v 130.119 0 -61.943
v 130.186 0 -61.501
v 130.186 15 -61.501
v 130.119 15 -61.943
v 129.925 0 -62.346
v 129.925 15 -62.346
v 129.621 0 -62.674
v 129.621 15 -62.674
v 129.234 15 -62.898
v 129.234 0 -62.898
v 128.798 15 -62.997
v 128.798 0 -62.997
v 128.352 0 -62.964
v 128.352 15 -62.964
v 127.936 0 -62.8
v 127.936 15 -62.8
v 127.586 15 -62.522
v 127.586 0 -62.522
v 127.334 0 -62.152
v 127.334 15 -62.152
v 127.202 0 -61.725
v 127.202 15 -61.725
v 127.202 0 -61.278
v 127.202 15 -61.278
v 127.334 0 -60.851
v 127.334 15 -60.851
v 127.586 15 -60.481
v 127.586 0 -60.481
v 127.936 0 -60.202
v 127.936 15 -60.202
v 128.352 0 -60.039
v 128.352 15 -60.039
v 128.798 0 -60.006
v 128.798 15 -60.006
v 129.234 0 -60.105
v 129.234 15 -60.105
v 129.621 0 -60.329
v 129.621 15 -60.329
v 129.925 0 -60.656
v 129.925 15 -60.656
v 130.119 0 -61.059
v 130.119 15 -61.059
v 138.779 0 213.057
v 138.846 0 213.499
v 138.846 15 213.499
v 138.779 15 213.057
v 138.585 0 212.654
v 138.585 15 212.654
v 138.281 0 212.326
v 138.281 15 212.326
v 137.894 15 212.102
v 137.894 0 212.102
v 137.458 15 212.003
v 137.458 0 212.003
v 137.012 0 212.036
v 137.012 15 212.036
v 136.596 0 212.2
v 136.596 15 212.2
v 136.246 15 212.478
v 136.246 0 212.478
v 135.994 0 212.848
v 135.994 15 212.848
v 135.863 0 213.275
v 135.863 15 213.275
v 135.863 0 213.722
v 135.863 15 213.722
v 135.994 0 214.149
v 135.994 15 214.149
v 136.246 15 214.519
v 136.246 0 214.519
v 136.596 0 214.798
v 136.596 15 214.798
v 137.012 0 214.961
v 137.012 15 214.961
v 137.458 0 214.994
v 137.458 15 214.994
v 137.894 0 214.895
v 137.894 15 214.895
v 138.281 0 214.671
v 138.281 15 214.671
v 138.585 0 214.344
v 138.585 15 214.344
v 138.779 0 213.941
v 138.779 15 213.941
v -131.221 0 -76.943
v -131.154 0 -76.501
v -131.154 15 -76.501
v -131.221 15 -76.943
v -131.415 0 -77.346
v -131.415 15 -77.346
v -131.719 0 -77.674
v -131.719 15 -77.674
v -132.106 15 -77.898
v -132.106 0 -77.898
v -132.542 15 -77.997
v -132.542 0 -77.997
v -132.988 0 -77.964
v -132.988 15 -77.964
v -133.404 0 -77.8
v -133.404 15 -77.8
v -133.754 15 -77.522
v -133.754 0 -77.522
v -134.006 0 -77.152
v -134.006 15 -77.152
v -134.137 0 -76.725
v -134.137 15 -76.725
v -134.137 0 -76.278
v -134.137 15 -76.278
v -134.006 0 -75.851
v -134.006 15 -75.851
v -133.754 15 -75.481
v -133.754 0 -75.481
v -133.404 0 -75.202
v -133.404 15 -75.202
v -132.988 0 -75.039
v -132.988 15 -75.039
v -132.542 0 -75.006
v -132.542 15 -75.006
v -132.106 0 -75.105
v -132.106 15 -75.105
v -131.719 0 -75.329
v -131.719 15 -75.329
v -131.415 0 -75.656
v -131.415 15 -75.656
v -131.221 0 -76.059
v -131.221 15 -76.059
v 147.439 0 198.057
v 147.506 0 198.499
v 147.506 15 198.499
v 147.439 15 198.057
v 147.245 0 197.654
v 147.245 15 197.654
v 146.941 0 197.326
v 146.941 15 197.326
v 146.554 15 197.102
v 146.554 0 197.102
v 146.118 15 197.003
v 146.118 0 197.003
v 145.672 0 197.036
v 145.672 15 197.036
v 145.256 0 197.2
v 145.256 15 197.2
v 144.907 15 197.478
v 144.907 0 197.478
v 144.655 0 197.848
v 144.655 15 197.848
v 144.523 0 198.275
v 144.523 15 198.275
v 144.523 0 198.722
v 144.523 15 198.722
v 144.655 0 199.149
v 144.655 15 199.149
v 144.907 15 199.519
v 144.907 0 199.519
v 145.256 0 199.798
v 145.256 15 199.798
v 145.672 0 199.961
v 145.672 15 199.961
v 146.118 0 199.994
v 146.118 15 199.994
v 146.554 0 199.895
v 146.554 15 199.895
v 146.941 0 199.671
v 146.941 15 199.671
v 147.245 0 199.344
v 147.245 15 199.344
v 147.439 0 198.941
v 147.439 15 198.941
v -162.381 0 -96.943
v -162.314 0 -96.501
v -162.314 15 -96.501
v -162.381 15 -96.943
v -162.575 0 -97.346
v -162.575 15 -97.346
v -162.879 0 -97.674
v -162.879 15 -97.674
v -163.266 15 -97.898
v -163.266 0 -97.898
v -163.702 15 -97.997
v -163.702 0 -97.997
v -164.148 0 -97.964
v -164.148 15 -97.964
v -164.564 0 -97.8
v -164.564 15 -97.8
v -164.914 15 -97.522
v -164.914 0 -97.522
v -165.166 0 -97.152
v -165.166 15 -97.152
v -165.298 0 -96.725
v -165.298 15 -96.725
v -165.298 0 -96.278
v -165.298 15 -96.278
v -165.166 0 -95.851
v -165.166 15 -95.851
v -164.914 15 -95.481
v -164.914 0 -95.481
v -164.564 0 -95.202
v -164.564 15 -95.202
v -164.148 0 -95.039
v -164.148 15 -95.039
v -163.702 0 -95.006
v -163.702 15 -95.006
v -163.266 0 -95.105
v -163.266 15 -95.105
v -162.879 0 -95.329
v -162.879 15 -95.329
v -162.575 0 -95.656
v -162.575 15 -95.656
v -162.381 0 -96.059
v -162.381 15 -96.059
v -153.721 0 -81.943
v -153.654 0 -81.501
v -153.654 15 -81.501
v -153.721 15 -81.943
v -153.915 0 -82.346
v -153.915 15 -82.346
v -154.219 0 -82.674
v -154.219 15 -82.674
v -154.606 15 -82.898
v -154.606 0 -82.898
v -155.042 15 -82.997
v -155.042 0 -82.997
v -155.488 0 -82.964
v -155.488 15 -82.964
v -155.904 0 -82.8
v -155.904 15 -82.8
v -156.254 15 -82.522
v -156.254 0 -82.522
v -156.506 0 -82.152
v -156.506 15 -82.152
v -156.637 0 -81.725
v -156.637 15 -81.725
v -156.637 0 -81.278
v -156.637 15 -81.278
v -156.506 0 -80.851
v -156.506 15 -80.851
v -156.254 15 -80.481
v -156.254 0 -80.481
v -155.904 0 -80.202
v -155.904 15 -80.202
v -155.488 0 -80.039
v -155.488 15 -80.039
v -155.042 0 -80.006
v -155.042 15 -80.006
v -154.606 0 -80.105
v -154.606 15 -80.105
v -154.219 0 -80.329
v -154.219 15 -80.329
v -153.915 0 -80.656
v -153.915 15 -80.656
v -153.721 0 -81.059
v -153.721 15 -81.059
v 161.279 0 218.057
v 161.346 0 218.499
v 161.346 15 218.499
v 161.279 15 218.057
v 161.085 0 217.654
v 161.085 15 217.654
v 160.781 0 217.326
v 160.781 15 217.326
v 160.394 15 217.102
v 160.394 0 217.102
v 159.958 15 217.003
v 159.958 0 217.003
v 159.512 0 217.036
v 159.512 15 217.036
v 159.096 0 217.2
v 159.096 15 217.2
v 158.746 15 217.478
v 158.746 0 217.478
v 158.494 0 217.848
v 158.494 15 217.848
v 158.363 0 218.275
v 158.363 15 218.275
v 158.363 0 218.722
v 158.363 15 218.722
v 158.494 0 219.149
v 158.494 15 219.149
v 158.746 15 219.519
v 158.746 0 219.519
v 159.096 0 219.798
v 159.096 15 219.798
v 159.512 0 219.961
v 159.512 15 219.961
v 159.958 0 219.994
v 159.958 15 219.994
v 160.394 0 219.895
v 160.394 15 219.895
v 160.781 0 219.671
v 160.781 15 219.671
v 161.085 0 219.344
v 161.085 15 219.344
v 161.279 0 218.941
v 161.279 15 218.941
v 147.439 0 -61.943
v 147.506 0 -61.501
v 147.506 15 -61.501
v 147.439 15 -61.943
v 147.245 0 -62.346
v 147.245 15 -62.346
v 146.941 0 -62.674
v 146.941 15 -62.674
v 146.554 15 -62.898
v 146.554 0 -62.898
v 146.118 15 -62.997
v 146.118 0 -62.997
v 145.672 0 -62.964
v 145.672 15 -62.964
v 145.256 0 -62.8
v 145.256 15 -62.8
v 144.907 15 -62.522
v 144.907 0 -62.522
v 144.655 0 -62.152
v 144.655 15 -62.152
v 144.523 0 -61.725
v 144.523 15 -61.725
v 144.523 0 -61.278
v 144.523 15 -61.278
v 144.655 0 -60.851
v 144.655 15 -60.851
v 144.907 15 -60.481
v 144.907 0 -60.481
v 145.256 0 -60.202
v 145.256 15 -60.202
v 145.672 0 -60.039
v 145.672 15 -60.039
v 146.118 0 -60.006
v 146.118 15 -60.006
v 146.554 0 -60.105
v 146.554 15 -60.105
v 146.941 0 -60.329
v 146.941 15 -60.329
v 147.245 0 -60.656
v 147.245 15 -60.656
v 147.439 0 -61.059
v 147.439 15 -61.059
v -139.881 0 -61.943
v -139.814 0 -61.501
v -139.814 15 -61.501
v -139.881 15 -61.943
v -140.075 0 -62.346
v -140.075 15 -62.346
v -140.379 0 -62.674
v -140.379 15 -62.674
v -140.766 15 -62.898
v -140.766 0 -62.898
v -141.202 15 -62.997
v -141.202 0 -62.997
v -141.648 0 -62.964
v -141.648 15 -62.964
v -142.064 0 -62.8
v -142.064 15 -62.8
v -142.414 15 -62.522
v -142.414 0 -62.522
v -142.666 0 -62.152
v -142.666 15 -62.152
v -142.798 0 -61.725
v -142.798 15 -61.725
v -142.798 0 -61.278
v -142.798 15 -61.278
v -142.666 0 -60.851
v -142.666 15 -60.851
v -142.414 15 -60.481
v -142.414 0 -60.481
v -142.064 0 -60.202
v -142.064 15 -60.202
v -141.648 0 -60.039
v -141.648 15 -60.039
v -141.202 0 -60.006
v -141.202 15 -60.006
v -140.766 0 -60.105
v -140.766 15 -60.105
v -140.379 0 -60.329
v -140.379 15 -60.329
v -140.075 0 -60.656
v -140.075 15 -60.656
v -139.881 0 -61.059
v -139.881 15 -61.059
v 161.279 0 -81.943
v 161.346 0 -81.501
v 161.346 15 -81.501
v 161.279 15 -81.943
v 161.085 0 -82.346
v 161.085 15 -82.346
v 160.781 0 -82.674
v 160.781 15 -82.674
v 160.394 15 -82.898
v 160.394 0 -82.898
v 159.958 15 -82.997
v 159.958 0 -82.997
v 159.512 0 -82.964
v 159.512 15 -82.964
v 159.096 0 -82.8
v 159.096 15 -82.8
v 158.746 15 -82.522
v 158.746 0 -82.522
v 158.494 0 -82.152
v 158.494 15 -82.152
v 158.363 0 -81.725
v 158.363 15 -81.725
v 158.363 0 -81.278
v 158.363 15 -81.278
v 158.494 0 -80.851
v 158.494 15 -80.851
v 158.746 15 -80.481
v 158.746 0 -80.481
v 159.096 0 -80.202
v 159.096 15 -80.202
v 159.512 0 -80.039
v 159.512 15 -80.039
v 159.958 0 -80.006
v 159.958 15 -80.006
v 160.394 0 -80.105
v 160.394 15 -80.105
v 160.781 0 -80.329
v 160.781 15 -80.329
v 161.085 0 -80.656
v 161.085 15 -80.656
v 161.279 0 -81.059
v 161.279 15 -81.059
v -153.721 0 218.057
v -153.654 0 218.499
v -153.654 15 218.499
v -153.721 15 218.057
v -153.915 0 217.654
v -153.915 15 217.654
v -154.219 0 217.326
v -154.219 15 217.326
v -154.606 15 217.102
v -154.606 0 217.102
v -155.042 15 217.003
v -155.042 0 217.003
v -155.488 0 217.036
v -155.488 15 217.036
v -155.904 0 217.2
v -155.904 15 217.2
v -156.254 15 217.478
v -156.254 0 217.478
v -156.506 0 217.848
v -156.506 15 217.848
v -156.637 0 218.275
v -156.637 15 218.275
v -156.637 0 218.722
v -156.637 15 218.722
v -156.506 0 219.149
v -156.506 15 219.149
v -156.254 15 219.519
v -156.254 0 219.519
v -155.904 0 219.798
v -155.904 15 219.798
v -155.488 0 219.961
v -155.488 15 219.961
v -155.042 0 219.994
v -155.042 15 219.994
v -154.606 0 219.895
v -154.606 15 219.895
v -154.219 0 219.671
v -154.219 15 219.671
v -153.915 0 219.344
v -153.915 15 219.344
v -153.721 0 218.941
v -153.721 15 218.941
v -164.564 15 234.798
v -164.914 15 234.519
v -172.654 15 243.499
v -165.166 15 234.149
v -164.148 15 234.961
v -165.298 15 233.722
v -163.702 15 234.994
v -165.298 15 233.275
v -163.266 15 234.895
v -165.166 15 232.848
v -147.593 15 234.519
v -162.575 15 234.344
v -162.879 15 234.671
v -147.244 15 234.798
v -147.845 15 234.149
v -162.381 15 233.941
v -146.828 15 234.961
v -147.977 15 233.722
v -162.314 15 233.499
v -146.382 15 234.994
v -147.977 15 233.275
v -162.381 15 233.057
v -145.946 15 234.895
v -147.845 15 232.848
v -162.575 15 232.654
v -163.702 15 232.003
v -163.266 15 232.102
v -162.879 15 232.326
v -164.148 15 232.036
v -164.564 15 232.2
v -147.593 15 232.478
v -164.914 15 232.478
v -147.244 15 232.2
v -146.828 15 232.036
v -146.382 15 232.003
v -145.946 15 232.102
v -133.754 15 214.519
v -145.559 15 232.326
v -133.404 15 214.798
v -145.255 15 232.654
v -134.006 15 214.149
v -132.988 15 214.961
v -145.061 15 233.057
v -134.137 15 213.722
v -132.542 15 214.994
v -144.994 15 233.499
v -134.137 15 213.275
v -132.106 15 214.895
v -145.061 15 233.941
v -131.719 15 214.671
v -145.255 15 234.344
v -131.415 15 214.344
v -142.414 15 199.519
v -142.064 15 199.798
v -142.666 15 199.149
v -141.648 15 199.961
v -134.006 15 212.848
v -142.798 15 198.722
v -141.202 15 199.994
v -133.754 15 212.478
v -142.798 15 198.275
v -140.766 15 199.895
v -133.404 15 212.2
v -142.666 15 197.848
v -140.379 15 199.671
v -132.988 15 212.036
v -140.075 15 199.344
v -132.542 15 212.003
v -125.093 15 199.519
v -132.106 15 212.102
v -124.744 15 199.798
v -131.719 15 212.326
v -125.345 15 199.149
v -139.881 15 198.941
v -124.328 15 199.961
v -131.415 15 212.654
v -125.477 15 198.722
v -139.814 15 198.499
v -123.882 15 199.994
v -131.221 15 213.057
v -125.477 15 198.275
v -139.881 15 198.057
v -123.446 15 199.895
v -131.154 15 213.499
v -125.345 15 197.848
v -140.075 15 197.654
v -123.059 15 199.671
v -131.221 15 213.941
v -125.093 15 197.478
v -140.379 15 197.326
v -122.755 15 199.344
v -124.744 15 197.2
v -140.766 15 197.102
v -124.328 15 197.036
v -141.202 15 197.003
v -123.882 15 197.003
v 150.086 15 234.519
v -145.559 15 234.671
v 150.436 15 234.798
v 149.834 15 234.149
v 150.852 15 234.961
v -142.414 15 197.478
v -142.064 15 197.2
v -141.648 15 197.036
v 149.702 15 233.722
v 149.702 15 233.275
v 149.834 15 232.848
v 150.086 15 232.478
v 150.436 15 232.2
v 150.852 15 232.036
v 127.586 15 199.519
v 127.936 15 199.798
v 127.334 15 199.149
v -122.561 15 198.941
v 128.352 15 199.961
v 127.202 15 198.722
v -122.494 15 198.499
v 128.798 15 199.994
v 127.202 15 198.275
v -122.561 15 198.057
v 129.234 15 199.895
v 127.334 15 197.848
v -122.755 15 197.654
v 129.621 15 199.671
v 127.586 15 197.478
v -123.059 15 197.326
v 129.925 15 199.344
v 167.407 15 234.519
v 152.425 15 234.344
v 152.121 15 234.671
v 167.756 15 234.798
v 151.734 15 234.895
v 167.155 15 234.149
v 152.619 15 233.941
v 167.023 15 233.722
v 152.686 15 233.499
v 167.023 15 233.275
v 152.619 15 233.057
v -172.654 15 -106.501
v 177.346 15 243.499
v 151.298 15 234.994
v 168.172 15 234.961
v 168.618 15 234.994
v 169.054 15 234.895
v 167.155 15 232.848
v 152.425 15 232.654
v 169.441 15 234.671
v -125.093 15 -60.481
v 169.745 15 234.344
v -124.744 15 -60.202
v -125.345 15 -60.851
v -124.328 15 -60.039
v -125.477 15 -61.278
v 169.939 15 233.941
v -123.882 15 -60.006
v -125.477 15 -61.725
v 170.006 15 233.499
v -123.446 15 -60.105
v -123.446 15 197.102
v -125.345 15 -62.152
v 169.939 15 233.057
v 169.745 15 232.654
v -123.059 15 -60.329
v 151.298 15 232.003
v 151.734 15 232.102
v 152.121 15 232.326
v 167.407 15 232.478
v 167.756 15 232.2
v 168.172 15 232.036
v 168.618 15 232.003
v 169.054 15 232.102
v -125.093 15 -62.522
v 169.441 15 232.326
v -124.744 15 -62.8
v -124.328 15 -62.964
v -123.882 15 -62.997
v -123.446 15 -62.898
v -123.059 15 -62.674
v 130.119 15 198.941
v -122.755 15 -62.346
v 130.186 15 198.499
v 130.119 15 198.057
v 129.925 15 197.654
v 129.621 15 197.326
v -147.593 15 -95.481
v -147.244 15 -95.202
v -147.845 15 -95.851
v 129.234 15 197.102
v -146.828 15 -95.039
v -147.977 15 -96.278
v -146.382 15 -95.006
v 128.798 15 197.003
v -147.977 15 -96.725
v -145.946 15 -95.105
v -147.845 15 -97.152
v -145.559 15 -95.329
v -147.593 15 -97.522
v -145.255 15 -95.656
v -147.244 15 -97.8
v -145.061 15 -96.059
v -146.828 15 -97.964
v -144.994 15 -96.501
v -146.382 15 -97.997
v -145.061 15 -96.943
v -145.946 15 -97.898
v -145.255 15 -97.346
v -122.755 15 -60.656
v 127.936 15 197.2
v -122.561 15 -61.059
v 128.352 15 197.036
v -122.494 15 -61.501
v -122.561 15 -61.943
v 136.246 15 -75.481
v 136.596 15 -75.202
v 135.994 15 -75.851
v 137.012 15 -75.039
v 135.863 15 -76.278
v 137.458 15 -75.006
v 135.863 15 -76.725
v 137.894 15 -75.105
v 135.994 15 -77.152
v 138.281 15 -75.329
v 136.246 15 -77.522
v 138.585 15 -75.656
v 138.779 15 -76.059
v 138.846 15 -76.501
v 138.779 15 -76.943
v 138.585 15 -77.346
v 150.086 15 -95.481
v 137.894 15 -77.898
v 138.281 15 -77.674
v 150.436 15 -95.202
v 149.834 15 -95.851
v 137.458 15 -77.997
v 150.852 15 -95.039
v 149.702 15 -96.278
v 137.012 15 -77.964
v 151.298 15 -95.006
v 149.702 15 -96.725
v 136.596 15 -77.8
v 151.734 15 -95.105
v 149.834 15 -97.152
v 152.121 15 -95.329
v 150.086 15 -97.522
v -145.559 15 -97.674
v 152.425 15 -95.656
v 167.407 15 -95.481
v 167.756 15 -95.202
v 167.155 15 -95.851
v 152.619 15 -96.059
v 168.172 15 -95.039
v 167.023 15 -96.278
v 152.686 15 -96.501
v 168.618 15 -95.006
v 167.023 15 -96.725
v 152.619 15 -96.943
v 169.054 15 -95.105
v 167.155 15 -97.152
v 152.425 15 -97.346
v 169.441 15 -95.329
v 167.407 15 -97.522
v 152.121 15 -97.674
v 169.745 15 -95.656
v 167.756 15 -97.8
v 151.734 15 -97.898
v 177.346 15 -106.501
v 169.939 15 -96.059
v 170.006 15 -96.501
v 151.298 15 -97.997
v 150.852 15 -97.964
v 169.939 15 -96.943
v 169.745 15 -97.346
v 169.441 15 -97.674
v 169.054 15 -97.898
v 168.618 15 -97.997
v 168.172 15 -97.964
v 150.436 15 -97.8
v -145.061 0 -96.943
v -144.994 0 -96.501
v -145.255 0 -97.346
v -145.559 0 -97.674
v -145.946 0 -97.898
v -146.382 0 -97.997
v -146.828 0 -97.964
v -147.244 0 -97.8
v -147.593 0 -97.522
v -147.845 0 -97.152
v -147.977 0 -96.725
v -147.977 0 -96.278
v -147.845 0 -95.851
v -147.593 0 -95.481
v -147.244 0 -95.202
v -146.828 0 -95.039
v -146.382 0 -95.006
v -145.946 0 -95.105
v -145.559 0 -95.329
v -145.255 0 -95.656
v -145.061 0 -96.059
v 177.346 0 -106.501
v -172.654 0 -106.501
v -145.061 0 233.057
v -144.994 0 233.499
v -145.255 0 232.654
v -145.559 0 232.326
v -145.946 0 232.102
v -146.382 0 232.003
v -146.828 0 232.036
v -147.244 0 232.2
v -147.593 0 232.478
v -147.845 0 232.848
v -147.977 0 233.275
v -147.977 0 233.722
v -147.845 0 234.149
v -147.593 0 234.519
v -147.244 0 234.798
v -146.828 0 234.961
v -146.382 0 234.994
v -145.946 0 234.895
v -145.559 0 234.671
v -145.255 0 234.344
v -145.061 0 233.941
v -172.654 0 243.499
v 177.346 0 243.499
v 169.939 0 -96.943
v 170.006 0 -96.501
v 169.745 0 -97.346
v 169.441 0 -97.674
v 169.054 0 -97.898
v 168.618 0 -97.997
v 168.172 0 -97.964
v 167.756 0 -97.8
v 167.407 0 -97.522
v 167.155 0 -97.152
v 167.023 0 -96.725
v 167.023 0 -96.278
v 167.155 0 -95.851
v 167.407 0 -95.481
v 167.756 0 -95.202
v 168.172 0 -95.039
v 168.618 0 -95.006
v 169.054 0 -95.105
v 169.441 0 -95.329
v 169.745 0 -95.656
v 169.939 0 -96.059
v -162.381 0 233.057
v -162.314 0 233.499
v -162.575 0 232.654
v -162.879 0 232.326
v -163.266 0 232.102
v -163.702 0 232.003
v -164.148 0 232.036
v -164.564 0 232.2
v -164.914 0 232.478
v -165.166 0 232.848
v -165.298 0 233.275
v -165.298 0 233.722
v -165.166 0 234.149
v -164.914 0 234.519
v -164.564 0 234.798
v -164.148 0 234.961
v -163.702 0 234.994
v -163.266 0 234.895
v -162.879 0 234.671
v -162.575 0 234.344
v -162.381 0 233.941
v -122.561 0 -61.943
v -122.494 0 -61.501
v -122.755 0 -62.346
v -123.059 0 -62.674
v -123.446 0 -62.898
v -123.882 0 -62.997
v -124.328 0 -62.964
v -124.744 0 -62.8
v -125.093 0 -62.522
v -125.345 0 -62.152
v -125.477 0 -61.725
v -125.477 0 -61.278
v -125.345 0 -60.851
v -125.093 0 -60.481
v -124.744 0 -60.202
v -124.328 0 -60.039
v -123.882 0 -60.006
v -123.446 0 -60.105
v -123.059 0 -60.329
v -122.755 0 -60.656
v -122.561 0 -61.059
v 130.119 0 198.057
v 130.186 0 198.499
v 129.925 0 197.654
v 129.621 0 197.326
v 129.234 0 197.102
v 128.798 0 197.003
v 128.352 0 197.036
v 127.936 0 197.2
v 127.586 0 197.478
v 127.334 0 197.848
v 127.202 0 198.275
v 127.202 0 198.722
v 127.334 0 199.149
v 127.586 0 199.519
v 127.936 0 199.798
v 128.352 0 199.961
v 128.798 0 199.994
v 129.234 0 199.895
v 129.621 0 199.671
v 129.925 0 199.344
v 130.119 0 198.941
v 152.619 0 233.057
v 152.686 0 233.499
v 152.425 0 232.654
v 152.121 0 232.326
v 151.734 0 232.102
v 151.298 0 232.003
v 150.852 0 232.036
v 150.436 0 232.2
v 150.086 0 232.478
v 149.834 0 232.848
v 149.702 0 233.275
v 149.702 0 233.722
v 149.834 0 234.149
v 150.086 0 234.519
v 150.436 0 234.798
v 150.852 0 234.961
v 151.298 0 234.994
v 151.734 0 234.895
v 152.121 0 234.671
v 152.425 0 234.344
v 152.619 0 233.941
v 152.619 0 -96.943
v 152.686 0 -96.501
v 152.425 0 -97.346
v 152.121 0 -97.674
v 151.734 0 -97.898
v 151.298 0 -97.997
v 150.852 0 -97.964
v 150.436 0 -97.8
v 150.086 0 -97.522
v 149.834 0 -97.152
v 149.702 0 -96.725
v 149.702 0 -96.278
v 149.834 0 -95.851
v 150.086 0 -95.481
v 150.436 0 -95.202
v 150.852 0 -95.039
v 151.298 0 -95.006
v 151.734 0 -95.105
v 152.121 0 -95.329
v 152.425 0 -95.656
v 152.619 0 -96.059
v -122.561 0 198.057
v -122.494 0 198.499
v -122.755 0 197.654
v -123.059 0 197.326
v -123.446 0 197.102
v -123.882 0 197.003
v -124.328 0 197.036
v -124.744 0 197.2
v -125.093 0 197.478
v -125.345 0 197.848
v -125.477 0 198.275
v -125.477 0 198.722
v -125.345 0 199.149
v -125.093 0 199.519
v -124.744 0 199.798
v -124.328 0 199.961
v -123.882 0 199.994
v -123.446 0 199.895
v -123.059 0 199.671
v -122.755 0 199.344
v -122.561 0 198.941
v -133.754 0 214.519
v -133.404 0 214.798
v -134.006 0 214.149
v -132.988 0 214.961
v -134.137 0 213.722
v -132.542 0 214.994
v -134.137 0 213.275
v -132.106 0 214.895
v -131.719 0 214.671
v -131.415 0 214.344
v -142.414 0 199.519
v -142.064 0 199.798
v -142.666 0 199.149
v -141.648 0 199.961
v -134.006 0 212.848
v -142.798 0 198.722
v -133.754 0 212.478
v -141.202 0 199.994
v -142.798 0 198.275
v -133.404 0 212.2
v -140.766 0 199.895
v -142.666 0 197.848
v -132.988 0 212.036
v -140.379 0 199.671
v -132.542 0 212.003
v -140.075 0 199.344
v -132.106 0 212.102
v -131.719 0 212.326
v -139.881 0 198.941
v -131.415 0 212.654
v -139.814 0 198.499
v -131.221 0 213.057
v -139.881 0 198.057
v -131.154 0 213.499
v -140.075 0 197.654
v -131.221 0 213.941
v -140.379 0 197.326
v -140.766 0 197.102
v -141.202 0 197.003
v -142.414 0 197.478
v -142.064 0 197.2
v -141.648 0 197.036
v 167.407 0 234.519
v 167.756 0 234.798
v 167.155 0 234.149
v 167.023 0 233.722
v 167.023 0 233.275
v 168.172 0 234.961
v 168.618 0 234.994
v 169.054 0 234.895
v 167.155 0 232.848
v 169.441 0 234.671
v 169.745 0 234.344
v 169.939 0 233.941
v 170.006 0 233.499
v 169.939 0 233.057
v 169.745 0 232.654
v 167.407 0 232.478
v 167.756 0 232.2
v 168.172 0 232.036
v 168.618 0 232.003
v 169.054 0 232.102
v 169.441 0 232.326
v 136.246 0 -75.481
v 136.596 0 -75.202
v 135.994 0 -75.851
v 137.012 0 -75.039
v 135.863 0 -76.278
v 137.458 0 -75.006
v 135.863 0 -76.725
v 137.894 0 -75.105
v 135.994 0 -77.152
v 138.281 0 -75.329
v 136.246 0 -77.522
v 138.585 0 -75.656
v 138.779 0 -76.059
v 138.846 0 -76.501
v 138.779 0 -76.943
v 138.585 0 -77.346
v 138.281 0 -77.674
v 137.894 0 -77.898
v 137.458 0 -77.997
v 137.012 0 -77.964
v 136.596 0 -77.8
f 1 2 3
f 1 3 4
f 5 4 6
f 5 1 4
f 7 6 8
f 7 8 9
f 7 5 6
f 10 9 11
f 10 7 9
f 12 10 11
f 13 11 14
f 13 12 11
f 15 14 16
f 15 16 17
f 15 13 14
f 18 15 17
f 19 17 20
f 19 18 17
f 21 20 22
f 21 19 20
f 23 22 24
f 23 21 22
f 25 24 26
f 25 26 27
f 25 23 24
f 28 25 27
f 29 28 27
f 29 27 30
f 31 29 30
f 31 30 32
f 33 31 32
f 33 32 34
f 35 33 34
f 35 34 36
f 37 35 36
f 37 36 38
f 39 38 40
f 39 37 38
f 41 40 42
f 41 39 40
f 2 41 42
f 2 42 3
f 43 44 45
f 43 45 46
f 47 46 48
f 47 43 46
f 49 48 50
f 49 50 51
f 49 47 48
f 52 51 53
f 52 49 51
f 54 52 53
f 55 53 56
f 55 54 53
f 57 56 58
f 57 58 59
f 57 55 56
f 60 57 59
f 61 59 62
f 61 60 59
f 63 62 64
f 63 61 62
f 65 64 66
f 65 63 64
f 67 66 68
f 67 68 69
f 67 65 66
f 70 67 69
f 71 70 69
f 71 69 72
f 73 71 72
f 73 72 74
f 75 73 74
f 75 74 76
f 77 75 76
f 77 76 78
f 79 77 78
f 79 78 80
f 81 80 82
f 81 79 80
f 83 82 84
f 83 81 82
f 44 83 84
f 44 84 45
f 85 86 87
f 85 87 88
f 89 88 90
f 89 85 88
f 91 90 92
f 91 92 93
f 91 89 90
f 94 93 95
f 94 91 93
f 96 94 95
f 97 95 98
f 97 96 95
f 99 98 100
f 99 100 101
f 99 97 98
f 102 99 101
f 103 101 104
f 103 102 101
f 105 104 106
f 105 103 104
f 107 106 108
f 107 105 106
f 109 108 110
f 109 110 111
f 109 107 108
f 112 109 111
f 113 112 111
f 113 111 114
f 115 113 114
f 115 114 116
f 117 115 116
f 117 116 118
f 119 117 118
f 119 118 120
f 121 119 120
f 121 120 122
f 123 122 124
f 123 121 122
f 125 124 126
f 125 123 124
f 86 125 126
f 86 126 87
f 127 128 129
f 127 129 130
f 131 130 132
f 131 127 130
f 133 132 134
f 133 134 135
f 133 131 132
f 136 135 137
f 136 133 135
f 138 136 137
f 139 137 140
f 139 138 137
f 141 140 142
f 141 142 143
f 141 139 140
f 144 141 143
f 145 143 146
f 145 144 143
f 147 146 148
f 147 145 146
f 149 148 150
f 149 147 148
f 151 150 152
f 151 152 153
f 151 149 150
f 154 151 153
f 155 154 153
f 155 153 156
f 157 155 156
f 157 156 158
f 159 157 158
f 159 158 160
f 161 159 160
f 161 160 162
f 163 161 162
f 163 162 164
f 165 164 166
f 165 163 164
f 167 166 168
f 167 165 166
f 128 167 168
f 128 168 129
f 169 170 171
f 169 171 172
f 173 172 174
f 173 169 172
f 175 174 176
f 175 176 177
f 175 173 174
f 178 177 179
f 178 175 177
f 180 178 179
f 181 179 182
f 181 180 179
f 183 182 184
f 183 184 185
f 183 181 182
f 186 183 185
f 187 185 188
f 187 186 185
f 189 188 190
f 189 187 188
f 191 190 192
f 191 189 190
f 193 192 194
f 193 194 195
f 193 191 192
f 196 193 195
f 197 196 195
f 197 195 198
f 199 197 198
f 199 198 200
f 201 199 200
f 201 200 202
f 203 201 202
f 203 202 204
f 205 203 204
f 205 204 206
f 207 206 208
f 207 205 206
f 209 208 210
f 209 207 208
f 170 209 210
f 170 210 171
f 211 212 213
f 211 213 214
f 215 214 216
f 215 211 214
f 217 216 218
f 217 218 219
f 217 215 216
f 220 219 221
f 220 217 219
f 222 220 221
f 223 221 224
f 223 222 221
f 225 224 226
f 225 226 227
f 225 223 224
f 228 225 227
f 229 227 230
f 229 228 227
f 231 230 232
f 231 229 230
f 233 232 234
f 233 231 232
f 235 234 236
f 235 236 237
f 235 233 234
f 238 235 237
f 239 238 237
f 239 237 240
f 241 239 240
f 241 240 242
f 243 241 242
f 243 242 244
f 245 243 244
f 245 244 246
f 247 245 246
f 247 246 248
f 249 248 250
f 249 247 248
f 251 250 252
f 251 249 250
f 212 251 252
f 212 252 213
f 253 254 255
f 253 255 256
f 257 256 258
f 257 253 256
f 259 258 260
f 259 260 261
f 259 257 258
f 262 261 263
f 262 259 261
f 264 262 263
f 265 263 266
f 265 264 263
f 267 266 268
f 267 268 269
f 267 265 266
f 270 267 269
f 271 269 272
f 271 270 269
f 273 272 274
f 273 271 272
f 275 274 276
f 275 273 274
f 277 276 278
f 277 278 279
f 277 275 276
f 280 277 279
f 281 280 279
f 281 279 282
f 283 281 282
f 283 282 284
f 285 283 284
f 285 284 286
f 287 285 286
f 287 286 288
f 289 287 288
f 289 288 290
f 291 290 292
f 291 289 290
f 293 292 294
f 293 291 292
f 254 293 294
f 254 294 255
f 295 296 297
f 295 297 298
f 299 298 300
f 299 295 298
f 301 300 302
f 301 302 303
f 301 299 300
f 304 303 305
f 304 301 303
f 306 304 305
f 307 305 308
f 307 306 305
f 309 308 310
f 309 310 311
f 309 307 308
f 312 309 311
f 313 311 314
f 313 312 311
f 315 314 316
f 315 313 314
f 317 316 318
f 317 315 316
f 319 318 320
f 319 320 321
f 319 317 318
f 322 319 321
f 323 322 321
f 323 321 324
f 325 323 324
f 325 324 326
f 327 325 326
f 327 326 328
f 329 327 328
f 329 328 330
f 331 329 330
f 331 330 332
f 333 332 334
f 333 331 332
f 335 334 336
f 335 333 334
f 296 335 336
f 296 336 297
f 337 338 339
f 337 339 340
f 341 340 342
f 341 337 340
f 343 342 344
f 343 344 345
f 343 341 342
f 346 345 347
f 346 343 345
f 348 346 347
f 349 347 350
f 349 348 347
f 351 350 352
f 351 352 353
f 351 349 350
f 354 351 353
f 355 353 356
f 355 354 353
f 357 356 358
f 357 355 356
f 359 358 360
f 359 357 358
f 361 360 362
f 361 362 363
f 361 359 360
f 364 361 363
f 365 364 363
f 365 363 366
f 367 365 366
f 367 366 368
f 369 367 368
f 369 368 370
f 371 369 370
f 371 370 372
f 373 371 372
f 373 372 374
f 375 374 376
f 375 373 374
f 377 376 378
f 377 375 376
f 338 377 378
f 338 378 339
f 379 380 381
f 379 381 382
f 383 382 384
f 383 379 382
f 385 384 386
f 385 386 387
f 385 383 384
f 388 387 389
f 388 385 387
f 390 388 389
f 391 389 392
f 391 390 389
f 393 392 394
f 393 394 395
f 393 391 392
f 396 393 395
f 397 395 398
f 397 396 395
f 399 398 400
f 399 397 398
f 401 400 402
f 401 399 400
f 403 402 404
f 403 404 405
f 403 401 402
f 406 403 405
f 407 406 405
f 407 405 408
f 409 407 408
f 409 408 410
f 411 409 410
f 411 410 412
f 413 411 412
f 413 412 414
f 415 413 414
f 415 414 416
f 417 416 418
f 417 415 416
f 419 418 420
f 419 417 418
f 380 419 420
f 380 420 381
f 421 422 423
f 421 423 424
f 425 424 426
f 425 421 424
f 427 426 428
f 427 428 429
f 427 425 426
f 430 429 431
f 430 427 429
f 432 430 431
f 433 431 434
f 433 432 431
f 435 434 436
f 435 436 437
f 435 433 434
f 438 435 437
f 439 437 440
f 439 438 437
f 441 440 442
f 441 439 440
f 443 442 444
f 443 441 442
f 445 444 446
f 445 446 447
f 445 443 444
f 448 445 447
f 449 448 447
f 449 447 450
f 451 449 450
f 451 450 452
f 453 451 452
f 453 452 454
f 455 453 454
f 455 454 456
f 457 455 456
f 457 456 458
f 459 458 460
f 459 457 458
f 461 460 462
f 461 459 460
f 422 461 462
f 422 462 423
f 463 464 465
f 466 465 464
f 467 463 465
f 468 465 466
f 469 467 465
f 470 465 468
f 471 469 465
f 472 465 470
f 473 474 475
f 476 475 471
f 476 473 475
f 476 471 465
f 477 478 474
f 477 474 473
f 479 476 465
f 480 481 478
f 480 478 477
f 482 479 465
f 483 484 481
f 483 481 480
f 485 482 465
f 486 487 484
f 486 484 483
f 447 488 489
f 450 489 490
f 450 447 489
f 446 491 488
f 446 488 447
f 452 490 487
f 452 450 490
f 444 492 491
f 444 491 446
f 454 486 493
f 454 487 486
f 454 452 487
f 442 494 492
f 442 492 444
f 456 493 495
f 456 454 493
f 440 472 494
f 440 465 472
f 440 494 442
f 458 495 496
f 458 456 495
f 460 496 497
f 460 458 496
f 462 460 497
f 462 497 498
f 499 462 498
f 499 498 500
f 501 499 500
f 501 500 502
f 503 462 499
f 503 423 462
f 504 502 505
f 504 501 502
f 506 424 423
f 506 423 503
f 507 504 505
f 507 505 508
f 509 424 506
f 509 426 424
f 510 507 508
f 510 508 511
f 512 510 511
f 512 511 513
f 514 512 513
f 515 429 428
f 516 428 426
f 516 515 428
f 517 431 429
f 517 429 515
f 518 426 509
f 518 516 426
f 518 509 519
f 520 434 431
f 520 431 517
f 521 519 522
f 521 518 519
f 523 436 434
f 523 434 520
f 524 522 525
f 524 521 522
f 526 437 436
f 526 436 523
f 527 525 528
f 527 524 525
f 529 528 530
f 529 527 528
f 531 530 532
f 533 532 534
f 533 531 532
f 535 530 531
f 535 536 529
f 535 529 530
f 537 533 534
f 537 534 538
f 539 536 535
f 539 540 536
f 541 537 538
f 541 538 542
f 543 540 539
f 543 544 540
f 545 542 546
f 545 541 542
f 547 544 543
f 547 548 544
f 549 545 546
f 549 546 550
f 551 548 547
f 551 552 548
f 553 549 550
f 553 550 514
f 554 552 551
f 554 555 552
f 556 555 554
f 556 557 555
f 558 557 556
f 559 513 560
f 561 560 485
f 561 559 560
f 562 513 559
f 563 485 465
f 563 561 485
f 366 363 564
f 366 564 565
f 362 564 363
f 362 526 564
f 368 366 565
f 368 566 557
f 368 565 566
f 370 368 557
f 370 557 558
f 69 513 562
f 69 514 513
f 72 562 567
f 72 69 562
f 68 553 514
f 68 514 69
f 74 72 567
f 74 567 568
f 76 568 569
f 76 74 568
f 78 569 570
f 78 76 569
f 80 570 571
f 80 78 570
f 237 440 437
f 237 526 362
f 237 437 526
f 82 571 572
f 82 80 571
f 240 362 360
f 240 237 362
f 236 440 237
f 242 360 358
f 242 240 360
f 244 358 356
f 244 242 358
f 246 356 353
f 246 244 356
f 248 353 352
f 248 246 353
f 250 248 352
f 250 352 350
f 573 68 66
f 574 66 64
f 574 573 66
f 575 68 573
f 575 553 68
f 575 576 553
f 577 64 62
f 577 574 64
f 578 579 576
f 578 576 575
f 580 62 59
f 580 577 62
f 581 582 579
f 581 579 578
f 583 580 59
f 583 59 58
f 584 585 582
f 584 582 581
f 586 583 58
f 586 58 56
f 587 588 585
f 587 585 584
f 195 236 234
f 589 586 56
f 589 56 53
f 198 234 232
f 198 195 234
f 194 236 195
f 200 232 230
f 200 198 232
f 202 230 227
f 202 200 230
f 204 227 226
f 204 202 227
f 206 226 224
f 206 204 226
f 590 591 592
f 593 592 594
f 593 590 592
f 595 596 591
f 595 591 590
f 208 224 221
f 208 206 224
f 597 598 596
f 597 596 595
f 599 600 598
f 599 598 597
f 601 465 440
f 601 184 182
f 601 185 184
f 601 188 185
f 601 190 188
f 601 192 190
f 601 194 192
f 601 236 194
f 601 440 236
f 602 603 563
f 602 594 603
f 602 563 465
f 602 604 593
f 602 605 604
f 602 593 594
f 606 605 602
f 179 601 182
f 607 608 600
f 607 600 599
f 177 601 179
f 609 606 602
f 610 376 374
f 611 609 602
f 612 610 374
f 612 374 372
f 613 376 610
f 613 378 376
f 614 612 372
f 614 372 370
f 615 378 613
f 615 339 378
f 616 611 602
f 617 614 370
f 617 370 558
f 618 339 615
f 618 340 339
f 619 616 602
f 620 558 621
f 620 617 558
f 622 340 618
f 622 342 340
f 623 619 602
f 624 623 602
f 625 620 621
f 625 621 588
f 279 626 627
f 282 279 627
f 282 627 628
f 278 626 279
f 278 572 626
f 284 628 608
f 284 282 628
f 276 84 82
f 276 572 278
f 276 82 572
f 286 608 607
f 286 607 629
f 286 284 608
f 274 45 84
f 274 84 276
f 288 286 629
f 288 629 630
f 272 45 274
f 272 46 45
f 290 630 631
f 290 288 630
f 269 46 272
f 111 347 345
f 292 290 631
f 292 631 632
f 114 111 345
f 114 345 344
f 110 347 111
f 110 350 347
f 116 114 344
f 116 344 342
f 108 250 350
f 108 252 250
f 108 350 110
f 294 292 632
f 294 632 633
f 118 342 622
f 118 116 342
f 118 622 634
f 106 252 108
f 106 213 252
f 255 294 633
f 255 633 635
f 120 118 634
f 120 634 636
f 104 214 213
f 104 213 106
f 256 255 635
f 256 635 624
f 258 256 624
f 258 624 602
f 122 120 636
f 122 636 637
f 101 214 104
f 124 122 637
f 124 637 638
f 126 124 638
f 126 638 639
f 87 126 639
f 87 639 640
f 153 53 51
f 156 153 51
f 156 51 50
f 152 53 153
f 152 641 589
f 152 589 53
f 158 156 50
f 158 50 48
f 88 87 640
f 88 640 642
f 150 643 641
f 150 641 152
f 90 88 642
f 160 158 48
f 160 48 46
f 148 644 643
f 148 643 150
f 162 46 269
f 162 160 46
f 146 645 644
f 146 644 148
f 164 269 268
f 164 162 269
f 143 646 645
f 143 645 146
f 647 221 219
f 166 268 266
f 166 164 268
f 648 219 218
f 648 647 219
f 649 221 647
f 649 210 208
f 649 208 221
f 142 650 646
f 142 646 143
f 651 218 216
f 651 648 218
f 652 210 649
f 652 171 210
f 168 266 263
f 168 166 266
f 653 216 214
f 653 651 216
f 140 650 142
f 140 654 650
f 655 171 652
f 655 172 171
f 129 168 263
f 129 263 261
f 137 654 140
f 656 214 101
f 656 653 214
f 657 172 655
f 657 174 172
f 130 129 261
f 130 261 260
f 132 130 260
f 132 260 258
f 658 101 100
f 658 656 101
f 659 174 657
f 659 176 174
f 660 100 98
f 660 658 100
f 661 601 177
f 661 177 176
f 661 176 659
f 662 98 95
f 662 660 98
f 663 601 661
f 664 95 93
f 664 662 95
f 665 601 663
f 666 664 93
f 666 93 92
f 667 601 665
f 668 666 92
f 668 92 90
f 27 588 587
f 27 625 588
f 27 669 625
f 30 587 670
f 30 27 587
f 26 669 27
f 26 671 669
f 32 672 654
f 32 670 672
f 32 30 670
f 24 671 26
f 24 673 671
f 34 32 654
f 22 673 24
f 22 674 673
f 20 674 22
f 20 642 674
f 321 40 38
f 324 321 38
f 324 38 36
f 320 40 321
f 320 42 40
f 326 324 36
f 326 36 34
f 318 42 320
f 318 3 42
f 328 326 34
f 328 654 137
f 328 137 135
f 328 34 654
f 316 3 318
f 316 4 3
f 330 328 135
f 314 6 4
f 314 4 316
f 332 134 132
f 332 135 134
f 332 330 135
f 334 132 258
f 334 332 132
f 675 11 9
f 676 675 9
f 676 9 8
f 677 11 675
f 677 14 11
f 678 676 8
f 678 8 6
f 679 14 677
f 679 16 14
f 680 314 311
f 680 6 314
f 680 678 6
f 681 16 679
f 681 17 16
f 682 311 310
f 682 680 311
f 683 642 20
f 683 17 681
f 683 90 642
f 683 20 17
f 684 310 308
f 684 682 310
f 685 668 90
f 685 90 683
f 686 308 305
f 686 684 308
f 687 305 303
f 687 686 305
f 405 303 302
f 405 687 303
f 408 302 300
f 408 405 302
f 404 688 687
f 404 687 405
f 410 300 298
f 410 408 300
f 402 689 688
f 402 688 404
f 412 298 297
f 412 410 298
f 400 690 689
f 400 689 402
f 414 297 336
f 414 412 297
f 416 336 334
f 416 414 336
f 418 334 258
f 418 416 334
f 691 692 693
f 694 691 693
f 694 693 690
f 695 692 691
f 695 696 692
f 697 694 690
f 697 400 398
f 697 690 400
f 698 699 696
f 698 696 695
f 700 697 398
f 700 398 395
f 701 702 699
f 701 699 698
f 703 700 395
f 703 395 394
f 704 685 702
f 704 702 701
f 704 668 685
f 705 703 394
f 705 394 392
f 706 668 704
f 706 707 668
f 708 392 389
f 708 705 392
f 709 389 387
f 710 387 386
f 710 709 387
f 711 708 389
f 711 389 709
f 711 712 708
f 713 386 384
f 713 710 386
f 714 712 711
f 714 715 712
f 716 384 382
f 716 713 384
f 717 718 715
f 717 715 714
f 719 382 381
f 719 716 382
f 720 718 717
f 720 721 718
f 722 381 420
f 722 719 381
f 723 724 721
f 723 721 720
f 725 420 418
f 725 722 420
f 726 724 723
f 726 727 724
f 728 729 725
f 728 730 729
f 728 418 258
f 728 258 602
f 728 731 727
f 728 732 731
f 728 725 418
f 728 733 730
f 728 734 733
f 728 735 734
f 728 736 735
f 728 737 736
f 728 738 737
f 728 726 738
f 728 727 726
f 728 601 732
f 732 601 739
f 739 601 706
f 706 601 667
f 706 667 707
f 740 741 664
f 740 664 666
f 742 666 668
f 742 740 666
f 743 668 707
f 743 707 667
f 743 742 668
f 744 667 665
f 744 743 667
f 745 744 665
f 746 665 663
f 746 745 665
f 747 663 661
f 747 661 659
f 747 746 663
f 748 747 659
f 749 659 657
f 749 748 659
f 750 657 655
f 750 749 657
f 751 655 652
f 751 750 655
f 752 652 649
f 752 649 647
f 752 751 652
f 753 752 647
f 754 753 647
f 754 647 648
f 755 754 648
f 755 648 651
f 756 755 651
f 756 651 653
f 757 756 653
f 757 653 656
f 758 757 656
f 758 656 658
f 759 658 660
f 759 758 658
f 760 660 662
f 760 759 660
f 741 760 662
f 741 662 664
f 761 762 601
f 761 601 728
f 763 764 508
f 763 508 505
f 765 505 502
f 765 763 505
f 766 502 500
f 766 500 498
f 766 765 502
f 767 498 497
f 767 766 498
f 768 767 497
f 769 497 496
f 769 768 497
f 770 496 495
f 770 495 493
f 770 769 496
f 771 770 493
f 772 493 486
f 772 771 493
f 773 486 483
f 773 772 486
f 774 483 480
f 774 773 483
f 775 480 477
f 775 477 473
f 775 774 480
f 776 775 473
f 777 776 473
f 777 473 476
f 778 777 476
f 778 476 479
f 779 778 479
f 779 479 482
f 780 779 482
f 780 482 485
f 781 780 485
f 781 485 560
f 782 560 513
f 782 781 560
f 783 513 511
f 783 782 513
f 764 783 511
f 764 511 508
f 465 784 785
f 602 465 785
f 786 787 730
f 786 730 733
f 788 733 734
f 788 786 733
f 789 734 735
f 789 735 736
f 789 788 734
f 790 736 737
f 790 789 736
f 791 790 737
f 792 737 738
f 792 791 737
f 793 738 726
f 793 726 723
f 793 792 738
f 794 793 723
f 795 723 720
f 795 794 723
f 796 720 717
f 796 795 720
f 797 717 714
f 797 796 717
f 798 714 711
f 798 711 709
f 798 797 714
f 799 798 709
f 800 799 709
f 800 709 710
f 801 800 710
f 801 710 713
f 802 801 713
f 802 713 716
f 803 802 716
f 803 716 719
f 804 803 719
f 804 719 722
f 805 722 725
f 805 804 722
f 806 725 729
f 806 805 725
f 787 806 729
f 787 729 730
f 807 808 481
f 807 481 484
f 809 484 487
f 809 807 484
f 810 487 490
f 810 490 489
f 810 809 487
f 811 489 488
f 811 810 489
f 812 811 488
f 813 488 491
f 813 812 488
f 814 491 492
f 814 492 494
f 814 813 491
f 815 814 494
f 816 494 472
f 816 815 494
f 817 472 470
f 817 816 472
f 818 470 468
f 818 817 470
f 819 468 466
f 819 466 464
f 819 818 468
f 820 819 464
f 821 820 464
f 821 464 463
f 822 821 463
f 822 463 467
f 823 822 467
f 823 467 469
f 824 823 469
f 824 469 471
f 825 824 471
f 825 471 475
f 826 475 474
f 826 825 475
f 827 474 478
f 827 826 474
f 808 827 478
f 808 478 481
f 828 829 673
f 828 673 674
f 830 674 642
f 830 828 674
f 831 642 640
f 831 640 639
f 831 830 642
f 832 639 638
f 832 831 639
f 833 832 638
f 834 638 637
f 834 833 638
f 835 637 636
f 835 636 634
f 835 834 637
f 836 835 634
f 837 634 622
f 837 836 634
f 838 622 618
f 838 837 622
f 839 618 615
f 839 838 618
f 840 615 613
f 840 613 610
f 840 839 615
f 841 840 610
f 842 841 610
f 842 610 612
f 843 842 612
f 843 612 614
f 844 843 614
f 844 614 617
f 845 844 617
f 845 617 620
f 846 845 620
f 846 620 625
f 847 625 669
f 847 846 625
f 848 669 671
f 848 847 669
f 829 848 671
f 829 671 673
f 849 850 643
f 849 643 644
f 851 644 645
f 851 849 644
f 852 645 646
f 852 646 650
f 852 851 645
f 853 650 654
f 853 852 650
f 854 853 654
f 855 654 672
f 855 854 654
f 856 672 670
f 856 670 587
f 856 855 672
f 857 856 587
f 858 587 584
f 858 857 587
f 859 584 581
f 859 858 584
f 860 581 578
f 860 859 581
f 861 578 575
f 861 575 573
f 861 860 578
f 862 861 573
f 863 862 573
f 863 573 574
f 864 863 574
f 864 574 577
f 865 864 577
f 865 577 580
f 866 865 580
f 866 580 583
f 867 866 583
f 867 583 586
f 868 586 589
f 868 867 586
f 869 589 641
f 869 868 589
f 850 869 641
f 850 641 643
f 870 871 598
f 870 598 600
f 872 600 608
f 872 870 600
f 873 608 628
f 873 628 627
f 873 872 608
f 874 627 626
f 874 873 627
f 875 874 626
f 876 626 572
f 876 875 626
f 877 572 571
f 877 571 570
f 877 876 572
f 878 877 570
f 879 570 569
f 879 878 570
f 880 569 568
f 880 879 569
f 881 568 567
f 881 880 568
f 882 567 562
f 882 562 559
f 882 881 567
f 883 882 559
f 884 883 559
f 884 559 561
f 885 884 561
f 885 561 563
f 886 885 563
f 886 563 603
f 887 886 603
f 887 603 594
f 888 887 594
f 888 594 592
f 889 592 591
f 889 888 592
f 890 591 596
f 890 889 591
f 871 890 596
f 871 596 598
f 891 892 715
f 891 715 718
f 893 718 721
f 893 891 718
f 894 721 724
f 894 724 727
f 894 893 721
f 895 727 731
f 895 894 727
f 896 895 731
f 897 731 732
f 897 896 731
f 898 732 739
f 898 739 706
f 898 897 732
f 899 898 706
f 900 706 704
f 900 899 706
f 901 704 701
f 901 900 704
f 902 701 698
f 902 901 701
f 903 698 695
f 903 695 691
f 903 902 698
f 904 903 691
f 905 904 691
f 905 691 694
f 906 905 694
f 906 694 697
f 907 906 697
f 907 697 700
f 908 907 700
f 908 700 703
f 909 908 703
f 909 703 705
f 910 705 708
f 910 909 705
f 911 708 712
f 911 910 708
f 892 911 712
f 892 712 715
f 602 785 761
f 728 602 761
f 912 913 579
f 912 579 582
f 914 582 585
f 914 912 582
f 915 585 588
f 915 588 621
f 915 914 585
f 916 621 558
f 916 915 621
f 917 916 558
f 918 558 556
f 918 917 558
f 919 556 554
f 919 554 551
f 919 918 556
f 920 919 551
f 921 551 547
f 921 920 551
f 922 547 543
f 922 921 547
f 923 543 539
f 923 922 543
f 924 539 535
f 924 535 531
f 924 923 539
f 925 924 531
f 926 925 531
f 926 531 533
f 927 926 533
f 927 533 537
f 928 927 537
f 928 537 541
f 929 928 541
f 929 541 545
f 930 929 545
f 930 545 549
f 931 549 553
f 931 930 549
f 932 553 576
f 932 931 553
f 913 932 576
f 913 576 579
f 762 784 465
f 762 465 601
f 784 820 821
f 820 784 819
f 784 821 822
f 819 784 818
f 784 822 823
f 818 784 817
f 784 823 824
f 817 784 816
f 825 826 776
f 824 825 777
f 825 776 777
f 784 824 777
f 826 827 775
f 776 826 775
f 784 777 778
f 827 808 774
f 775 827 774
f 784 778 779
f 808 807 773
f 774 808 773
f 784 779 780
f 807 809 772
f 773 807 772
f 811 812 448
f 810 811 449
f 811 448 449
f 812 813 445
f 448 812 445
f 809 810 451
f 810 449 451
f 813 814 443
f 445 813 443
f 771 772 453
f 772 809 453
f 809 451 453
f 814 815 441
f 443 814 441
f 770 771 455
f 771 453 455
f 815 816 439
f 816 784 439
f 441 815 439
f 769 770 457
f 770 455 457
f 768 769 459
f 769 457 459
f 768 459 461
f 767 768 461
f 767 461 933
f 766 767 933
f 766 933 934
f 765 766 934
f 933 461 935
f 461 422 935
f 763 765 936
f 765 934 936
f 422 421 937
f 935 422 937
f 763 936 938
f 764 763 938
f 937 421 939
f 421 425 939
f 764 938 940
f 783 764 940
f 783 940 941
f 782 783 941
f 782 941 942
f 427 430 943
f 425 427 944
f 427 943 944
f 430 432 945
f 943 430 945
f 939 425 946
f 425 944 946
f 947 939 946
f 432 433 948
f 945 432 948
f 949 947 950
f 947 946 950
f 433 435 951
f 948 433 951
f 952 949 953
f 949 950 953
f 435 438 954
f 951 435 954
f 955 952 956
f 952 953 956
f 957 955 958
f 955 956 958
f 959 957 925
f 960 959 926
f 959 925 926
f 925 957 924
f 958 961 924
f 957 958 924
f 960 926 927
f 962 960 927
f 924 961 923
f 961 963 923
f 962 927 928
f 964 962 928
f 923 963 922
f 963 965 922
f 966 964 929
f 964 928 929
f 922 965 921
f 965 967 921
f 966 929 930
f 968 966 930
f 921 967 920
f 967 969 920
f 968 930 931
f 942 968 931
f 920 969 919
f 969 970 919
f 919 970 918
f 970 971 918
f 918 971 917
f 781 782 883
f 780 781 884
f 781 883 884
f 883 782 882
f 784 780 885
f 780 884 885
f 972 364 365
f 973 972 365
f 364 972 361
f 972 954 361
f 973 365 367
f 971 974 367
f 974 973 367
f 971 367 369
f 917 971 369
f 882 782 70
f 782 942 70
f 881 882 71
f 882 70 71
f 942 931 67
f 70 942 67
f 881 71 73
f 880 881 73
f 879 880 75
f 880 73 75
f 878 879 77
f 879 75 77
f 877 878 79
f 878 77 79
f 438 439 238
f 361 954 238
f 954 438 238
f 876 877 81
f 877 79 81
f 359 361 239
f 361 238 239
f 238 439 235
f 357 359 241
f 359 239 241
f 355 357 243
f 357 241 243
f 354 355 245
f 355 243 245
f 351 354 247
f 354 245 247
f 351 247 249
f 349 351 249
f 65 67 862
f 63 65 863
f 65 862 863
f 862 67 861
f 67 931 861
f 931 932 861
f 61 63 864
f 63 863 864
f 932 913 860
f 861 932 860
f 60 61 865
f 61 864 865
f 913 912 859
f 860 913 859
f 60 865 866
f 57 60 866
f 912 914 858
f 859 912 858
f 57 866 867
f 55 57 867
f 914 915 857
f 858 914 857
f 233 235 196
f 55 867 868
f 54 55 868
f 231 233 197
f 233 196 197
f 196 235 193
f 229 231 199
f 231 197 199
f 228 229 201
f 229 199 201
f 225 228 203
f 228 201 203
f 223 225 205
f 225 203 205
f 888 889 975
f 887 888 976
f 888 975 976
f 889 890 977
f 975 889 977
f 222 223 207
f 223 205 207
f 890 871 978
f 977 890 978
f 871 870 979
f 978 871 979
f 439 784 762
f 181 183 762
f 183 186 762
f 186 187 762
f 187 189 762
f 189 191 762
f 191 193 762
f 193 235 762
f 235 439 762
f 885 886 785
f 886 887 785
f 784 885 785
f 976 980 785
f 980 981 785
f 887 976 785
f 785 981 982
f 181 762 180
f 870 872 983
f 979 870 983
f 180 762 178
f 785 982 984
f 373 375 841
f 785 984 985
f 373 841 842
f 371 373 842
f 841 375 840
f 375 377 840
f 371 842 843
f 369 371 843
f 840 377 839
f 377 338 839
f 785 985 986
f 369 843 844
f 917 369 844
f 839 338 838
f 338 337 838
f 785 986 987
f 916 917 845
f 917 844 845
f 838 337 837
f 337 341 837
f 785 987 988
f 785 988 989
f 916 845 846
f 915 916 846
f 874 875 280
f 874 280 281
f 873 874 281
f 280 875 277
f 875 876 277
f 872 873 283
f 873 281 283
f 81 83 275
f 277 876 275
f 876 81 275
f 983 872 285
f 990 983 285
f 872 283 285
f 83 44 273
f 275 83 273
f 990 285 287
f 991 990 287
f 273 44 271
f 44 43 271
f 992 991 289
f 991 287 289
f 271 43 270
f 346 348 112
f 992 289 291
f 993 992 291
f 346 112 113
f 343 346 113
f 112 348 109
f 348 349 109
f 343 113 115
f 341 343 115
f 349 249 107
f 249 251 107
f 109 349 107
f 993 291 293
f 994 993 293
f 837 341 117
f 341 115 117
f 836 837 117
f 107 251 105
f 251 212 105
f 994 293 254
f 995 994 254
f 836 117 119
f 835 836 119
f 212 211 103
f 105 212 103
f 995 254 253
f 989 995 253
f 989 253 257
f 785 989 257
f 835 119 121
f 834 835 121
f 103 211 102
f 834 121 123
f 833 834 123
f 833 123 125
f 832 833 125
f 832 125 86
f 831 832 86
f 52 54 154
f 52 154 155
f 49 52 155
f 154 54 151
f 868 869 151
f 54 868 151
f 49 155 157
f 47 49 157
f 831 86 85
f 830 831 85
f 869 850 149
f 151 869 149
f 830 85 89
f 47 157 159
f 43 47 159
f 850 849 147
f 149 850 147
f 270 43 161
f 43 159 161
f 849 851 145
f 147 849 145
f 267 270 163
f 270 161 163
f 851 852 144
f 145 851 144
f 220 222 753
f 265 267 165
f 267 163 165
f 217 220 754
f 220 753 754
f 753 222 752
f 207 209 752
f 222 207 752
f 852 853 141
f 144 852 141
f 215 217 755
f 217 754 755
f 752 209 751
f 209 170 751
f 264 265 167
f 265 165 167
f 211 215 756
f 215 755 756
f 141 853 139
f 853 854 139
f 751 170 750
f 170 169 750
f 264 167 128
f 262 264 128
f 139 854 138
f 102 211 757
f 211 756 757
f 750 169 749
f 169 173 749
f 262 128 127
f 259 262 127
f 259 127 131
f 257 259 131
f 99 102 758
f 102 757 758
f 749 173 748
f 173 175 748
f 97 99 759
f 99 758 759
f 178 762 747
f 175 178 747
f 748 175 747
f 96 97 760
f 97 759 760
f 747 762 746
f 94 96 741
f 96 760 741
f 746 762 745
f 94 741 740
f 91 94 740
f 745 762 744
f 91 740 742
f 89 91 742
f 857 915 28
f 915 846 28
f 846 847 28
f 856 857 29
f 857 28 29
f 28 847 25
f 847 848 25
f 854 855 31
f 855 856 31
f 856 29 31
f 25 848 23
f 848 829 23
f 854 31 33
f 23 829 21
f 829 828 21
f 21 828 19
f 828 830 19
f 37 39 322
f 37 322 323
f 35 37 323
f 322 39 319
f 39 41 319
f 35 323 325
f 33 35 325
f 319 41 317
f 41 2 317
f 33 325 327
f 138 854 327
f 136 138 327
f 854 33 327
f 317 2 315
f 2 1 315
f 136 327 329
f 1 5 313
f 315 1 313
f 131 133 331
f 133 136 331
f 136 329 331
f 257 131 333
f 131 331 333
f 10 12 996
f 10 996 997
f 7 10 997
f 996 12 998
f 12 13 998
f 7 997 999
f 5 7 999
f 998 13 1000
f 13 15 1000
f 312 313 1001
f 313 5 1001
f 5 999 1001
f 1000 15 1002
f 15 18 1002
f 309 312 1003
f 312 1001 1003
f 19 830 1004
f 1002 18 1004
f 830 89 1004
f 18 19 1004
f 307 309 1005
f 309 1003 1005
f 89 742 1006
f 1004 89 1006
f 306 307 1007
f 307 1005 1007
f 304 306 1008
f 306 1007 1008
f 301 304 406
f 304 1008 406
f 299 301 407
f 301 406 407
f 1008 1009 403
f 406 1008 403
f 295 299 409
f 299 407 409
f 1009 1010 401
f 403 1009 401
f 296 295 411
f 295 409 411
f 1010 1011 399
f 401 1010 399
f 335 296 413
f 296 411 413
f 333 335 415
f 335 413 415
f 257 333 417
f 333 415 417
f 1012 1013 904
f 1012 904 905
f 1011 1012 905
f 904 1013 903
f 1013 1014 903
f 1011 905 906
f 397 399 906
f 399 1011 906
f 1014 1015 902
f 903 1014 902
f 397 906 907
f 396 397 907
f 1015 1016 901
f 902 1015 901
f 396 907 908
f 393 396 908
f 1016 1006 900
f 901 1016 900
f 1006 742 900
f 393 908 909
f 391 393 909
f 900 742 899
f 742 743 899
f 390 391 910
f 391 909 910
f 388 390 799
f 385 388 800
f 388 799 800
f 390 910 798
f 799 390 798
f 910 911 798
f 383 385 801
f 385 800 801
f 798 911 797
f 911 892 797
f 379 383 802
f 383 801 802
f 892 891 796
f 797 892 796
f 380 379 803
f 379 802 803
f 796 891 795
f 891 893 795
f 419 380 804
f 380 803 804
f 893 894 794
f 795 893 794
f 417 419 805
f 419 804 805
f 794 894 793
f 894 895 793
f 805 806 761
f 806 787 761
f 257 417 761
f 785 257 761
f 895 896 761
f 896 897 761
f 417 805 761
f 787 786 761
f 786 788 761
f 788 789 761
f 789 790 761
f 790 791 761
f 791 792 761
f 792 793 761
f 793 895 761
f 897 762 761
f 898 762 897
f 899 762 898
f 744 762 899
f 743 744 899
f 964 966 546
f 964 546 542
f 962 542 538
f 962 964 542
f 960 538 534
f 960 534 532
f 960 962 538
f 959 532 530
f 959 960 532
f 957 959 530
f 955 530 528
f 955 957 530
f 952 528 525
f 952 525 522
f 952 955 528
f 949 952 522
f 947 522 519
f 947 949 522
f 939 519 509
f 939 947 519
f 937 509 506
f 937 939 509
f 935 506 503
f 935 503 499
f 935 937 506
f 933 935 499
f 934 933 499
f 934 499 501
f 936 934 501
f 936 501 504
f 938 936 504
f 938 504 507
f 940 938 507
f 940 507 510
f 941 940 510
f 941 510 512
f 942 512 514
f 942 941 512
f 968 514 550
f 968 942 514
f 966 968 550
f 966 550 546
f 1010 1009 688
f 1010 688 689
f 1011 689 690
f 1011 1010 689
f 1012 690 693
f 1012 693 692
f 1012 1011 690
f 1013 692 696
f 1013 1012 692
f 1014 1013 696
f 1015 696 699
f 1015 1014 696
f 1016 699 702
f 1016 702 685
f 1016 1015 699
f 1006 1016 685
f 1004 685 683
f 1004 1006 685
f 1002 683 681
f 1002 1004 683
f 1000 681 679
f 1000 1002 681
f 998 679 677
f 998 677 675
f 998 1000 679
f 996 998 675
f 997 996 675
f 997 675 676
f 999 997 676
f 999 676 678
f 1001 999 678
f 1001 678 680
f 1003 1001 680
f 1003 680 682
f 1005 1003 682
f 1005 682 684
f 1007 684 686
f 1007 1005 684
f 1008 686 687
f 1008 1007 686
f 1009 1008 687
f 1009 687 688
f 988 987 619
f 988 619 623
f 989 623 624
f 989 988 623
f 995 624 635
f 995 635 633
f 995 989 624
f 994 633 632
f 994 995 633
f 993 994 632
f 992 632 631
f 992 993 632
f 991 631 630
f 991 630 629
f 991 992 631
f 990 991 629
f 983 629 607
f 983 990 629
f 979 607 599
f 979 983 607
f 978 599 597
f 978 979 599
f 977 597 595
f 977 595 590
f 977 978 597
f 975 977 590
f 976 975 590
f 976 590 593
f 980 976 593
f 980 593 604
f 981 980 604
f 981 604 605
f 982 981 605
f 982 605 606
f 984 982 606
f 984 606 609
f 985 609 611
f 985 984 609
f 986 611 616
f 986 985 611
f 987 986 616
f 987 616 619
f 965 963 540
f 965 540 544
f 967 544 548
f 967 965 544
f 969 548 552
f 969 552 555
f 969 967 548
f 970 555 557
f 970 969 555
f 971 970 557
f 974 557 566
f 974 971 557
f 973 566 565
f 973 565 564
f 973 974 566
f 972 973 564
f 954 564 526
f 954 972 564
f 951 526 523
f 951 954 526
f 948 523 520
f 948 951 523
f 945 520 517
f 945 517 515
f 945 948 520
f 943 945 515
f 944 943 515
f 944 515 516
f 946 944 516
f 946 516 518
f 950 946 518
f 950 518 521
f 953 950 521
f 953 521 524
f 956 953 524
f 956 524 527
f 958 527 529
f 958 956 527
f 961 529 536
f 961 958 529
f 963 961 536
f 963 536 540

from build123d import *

# Parameters (mm, degrees)
SKETCH2_W           = 350
SKETCH2_H           = 350
SKETCH2_R           = 1.5
BOSS_EXTRUDE1_DEPTH = 15


with BuildPart() as part:
    # Sketch2 → Boss-Extrude1 (new body)
    with BuildSketch(Plane(origin=(0, 0, 0), x_dir=(1, 0, 0), z_dir=(0, 1, 0))):
        with Locations((2.345844504, -68.498659517)):
            Rectangle(SKETCH2_W, SKETCH2_H)
        with Locations((159.845844504, -218.498659517)):
            Circle(SKETCH2_R, mode=Mode.SUBTRACT)
        with Locations((168.506098542, -233.498659517)):
            Circle(SKETCH2_R, mode=Mode.SUBTRACT)
        with Locations((151.185590466, -233.498659517)):
            Circle(SKETCH2_R, mode=Mode.SUBTRACT)
        with Locations((168.506098542, 96.501340483)):
            Circle(SKETCH2_R, mode=Mode.SUBTRACT)
        with Locations((159.845844504, 81.501340483)):
            Circle(SKETCH2_R, mode=Mode.SUBTRACT)
        with Locations((151.185590466, 96.501340483)):
            Circle(SKETCH2_R, mode=Mode.SUBTRACT)
        with Locations((-163.814409534, 96.501340483)):
            Circle(SKETCH2_R, mode=Mode.SUBTRACT)
        with Locations((-146.493901458, 96.501340483)):
            Circle(SKETCH2_R, mode=Mode.SUBTRACT)
        with Locations((-155.154155496, 81.501340483)):
            Circle(SKETCH2_R, mode=Mode.SUBTRACT)
        with Locations((-155.154155496, -218.498659517)):
            Circle(SKETCH2_R, mode=Mode.SUBTRACT)
        with Locations((-146.493901458, -233.498659517)):
            Circle(SKETCH2_R, mode=Mode.SUBTRACT)
        with Locations((-163.814409534, -233.498659517)):
            Circle(SKETCH2_R, mode=Mode.SUBTRACT)
        with Locations((137.345844504, 76.501340483)):
            Circle(SKETCH2_R, mode=Mode.SUBTRACT)
        with Locations((146.006098542, 61.501340483)):
            Circle(SKETCH2_R, mode=Mode.SUBTRACT)
        with Locations((128.685590466, 61.501340483)):
            Circle(SKETCH2_R, mode=Mode.SUBTRACT)
        with Locations((-123.993901458, 61.501340483)):
            Circle(SKETCH2_R, mode=Mode.SUBTRACT)
        with Locations((-141.314409534, 61.501340483)):
            Circle(SKETCH2_R, mode=Mode.SUBTRACT)
        with Locations((-132.654155496, 76.501340483)):
            Circle(SKETCH2_R, mode=Mode.SUBTRACT)
        with Locations((-141.314409534, -198.498659517)):
            Circle(SKETCH2_R, mode=Mode.SUBTRACT)
        with Locations((-123.993901458, -198.498659517)):
            Circle(SKETCH2_R, mode=Mode.SUBTRACT)
        with Locations((-132.654155496, -213.498659517)):
            Circle(SKETCH2_R, mode=Mode.SUBTRACT)
        with Locations((128.685590466, -198.498659517)):
            Circle(SKETCH2_R, mode=Mode.SUBTRACT)
        with Locations((146.006098542, -198.498659517)):
            Circle(SKETCH2_R, mode=Mode.SUBTRACT)
        with Locations((137.345844504, -213.498659517)):
            Circle(SKETCH2_R, mode=Mode.SUBTRACT)
    extrude(amount=BOSS_EXTRUDE1_DEPTH)


solid = part.part
